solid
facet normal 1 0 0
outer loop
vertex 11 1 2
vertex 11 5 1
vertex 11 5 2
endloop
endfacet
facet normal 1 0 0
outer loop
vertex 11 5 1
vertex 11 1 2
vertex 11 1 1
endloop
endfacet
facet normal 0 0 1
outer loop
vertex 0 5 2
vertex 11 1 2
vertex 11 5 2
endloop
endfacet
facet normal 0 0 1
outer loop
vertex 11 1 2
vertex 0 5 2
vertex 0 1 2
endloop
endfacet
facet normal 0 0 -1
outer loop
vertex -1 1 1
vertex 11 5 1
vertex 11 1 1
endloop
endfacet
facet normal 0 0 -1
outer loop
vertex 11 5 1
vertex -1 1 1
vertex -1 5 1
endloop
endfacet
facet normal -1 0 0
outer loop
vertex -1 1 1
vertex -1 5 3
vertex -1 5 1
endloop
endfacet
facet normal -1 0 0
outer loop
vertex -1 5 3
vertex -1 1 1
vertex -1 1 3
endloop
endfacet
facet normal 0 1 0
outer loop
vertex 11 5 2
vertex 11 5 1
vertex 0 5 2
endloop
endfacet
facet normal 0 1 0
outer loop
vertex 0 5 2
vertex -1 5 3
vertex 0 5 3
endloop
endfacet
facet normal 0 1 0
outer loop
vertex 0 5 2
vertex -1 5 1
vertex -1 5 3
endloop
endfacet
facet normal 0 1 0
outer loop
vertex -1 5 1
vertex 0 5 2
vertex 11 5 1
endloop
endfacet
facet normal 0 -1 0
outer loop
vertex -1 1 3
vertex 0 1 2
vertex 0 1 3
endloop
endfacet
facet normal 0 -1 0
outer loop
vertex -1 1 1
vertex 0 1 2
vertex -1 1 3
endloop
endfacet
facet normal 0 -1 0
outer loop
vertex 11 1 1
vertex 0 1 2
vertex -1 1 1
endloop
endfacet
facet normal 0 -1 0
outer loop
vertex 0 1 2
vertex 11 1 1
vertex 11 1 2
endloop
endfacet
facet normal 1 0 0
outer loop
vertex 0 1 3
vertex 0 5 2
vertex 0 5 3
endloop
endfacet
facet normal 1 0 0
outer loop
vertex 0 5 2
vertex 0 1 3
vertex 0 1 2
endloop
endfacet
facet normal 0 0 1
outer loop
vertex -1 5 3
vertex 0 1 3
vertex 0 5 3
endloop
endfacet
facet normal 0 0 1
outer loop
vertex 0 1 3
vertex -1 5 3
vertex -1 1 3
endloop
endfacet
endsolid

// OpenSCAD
module outer_box(){
	cube([6,6,1]);

	translate([0,0,1])
		cube([6,1,2]);

	translate([0,5,1])
		cube([6,1,2]);

	translate([2,1,2])
		cube([3,4,1]);
}

module inner_slide(){
	color("blue")
		translate([-1,1,1]){
			cube([12,4,1]);
			cube([1,4,2]);
	}
}

%outer_box();
inner_slide();
